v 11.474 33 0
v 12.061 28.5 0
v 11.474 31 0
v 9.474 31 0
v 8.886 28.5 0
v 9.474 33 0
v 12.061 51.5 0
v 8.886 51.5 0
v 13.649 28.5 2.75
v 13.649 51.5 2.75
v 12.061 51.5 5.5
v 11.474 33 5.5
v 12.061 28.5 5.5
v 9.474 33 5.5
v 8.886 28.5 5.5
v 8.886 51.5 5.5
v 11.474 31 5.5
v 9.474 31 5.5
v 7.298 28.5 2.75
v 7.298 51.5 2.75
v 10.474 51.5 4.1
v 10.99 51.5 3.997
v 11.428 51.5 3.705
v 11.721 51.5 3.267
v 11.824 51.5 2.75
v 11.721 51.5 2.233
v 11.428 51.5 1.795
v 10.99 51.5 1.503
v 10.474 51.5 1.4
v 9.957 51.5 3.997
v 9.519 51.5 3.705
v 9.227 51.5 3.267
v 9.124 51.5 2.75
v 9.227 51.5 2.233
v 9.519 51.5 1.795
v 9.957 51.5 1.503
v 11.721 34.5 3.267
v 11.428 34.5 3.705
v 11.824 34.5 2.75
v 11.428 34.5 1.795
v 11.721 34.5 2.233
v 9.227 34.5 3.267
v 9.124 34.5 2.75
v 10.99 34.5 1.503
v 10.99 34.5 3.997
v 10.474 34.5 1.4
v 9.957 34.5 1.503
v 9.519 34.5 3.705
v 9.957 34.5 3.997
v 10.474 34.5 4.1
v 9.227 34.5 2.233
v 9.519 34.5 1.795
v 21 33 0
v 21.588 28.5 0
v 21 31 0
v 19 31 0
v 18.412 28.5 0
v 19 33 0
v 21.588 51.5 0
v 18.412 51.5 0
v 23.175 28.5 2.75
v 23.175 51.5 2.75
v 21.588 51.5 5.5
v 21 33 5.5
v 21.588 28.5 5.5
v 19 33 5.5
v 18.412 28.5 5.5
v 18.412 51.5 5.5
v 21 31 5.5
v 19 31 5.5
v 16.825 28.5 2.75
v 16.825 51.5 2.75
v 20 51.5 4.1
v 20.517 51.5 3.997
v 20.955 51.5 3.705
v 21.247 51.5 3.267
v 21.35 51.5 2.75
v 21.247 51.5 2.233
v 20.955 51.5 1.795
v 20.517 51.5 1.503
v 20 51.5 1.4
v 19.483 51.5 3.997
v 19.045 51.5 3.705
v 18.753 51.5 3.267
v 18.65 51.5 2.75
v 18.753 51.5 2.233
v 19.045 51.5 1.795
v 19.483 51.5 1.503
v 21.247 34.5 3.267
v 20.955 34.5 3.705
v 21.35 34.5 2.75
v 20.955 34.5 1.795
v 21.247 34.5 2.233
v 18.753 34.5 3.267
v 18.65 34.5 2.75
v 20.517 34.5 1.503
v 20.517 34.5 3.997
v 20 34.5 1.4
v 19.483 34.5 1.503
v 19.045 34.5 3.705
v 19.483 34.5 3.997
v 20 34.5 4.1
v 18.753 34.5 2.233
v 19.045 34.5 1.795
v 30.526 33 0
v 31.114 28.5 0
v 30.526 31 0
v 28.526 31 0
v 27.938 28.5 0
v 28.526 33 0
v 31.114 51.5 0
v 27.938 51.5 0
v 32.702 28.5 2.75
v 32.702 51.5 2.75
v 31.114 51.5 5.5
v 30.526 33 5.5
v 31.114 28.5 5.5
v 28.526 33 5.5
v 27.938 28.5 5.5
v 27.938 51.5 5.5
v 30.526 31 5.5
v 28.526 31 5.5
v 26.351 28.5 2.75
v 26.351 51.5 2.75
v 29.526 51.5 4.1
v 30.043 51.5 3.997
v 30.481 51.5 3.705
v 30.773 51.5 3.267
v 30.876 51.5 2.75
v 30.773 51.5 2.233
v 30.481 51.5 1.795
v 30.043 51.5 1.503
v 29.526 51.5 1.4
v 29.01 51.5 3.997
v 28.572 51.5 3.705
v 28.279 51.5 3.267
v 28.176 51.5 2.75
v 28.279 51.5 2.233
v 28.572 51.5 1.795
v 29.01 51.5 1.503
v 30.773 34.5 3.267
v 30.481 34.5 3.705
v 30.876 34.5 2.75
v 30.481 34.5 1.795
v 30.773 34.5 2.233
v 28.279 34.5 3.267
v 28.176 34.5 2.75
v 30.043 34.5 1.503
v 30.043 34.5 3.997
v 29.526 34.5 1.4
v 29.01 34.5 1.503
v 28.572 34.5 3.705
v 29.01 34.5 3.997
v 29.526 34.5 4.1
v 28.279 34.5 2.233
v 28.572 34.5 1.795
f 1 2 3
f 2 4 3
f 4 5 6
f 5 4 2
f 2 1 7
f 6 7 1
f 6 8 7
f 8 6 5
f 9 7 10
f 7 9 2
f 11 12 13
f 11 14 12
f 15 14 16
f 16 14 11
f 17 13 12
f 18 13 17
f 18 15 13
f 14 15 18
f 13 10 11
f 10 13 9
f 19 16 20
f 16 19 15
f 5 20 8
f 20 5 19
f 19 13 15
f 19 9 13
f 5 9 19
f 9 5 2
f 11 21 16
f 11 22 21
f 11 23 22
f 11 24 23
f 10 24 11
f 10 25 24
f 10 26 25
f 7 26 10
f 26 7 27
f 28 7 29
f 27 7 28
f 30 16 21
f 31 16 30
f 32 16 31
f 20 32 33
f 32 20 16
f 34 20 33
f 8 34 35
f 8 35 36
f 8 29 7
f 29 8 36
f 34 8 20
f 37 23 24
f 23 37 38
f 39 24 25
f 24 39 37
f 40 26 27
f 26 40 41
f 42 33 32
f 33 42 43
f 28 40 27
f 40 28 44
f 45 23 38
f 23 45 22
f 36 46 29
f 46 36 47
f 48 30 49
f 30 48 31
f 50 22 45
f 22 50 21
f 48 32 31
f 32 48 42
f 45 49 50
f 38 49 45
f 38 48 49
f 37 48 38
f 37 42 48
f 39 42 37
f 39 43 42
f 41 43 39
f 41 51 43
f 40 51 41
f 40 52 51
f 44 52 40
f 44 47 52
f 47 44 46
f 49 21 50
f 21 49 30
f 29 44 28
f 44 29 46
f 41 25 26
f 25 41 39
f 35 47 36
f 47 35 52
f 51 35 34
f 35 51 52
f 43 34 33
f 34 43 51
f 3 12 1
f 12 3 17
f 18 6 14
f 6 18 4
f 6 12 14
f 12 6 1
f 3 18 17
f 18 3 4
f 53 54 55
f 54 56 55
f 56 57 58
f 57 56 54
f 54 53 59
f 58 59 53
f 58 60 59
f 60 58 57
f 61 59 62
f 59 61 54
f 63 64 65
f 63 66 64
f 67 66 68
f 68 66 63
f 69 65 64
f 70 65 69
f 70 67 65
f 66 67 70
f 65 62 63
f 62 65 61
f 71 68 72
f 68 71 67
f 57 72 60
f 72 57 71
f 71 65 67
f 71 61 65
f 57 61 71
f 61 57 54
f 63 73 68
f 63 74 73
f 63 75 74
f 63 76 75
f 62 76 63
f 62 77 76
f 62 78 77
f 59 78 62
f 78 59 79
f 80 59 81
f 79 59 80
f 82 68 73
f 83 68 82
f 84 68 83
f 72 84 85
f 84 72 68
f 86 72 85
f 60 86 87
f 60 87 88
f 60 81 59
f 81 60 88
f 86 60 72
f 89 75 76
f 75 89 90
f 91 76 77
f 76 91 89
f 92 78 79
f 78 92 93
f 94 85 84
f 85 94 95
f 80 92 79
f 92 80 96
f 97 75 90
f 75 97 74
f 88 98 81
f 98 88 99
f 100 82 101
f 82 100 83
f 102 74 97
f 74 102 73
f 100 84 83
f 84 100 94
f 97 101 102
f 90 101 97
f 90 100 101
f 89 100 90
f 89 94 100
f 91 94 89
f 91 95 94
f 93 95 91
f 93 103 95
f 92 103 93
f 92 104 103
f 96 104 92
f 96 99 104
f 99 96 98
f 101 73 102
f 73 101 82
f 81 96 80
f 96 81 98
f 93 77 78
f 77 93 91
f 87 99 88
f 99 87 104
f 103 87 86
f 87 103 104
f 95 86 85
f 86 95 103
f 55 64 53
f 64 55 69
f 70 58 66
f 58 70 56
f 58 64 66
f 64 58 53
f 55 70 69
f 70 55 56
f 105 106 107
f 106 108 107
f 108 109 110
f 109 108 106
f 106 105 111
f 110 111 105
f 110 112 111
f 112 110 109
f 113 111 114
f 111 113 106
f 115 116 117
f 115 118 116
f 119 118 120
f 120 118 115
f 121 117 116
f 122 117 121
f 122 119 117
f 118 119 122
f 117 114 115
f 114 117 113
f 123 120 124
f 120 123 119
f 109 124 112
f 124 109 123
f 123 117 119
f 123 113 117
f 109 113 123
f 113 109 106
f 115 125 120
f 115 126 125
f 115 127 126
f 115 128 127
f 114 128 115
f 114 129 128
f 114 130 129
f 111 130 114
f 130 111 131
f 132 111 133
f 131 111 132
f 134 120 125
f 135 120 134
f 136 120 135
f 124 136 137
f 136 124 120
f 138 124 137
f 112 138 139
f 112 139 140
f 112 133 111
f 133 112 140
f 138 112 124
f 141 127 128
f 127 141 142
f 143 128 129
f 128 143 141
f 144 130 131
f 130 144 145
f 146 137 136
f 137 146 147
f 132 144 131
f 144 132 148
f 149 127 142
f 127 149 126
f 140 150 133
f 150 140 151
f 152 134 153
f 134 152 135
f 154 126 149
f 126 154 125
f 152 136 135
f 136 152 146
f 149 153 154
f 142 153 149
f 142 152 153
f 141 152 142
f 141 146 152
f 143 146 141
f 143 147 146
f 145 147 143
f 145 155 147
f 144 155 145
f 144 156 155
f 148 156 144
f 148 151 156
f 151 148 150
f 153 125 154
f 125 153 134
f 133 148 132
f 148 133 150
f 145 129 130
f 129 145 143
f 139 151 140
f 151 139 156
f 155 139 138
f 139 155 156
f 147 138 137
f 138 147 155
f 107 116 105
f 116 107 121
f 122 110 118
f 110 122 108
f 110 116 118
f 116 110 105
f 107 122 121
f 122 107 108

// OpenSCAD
/*

Parametric Prosthetic Hand String Tensioner
Based on a part designed by Ivan Owen
Put into parametric format by David Orgeman

Released under the terms of the GNU GPL v3.0 

This program is free software: you can redistribute it and/or modify
it under the terms of the GNU General Public License as published by
the Free Software Foundation, either version 3 of the License, or
(at your option) any later version.

This program is distributed in the hope that it will be useful,
but WITHOUT ANY WARRANTY; without even the implied warranty of
MERCHANTABILITY or FITNESS FOR A PARTICULAR PURPOSE. See the
GNU General Public License for more details.

You should have received a copy of the GNU General Public License
along with this program. If not, see <http://www.gnu.org/licenses/>.

*/


Metric_Table=[ 	["M2", 0.8000, 1.1000, 2.3094], 
				["M25", 1.0250, 1.3750, 2.8868], 
				["M3", 1.2500, 1.6500, 3.1754], 
                ["M35", 1.3500, 1.6500, 3.1754],
				["M4", 1.6500, 2.2000, 4.0415], 
				["M5", 2.1000, 2.7500, 4.6188]  ];


//Standard hole sizes for tapping into plastic
//M2T=1.60;
//M25T=2.05;
//M3T=2.5;
//M4T=3.3;
//M5T=4.2;

//Standard hole sizes for metric screws
//M2=2.2;
//M25=2.75;
//M3=3.3;
//M4=4.4;
//M5=5.5;

//Standard nut sizes - flat-to-flat and then as radius
//M2NutW=4.0;
//M25NutW=5.0;
//M3NutW=5.5;
//M4NutW=7.0;
//M5NutW=8.0;
//M2NutR=(M2NutW/cos(30))/2;
//M25NutR=(M25NutW/cos(30))/2;
//M3NutR=(M3NutW/cos(30))/2;
//M4NutR=(M4NutW/cos(30))/2;
//M5NutR=(M5NutW/cos(30))/2;


//PARAMETERS

//size of the tuner drive screws
Tuner_Size="M35";//[ M2, M25, M3, M4, M5 ]

Metric_Index=search([Tuner_Size], Metric_Table)[0];
Tuner_Screw_Radius=Metric_Table[Metric_Index][1];
Block_Screw_Radius=Metric_Table[Metric_Index][2];
Rod_Radius=Metric_Table[Metric_Index][3];

//extra elevation of the tuners and strings above the gauntlet
Extra_Tuner_Height=-2.0;

//slightly increase the length of rods and tuner block for springs
Spring_Length_Adjustment=0;

//length of the spring covering shell on the back of the tuner
Spring_Shield_Adjustment=0;

//functional length of the tuner rods
Rod_Length=18.0;

//extra tuner rod length to tie the strings to.
Extra_Tuner_Length=5.0;

//size of the hole through the tuners for the drive strings
String_Radius=1.0;

//number of tuners - most will want 5, some might want 4
Tuner_Count=3;//[1, 2, 3, 4, 5]

//extra gap in the tuner slots to allow them to slide more readily
Tuner_Fit=0.15;


//0 to print tuners, 1 to omit them
Print_Tuners=0;//[0, 1]

//0 to print the block, 1 to omit it
Print_Block=1;//[0, 1]

b1 = 2.1;
b2 = b1 *2;
b3 = 3.8;
b4 = 2.6;
r1 = 2.2;


//RENDER
if (Print_Block == 0)
	{
	translate([0, 0, 3])
		block();
	}
	

if (Print_Tuners == 0)
	{
	if (Tuner_Count>0)
		{
		for(i=[1:Tuner_Count])
			{
			translate([20-3*Rod_Radius*(Tuner_Count+1)/2 + 3*Rod_Radius*i, 40, 0])
				tuner();
			}
		}
	}


module block()
	{
        
	rotate(a=[0, 0, -90])
	difference()
		{
		translate([-b1*Rod_Radius*(Tuner_Count+1)/2, 0, -3])
			cube([b2*Rod_Radius*(Tuner_Count+1)/2, Rod_Length+3+Spring_Length_Adjustment+Spring_Shield_Adjustment, b3*Rod_Radius+Extra_Tuner_Height+3]);
									
		for(i=[1:Tuner_Count])
			{
			translate([-b4*Rod_Radius*(Tuner_Count+1)/2 + b4*Rod_Radius*i, Rod_Length+0.5+Spring_Length_Adjustment, 1.9*Rod_Radius+Extra_Tuner_Height])
				rotate(a=[0, 30, 0])
				rotate(a=[90, 0, 0])
					cylinder(h=Rod_Length+2+Spring_Length_Adjustment, r=Rod_Radius+Tuner_Fit, $fn=6);
			}

		for(i=[1:Tuner_Count])
			{
			translate([-b4*Rod_Radius*(Tuner_Count+1)/2 + b4*Rod_Radius*i, 50, 1.9*Rod_Radius+Extra_Tuner_Height])
				rotate(a=[0, 30, 0])
				rotate(a=[90, 0, 0])
					cylinder(h=100, r=Block_Screw_Radius/cos(30), $fn=6);
			}
		
		translate([-b1*Rod_Radius*(Tuner_Count+1)/2-0.01, 0, b3*Rod_Radius+Extra_Tuner_Height+0.01])
			rotate(a=[-90, 0, 0])
				fillet(r=r1*Rod_Radius, h=200);
		translate([b1*Rod_Radius*(Tuner_Count+1)/2+0.01, 0, b3*Rod_Radius+Extra_Tuner_Height+0.01])
			rotate(a=[0, 90, 0])
			rotate(a=[-90, 0, 0])
				fillet(r=r1*Rod_Radius, h=200);

		difference()
			{
			translate([-b1*Rod_Radius*(Tuner_Count+1)/2+2, Rod_Length+3+Spring_Length_Adjustment, -6])
				cube([b2*Rod_Radius*(Tuner_Count+1)/2-4, Spring_Shield_Adjustment+2, b3*Rod_Radius+Extra_Tuner_Height+6-2]);
			translate([-b1*Rod_Radius*(Tuner_Count+1)/2+2-0.01, 0, b3*Rod_Radius+Extra_Tuner_Height-2+0.01])
				rotate(a=[-90, 0, 0])
					fillet(r=1.6*Rod_Radius, h=200);
			translate([b1*Rod_Radius*(Tuner_Count+1)/2-2+0.01, 0, b3*Rod_Radius+Extra_Tuner_Height-2+0.01])
				rotate(a=[0, 90, 0])
				rotate(a=[-90, 0, 0])
					fillet(r=1.6*Rod_Radius, h=200);
			}

		}	
	}	
	
	
module tuner()
	{
	translate([0, (Rod_Length+Extra_Tuner_Length+Spring_Length_Adjustment)/2, Rod_Radius*cos(30)])
	difference()
		{
		rotate(a=[90, 0, 0])
			cylinder(h=Rod_Length+Extra_Tuner_Length+Spring_Length_Adjustment, r=Rod_Radius, $fn=6);
		translate([0, 1, 0])
			rotate(a=[90, 0, 0])
				cylinder(h=Rod_Length+Spring_Length_Adjustment, r=Tuner_Screw_Radius, $fn=16);
		translate([-String_Radius, -Rod_Length-Spring_Length_Adjustment-Extra_Tuner_Length/2, -10])
//			polyhole(h=20, d=String_Radius*2);
//			cylinder(h=20, r=String_Radius, center=true);
			cube([2*String_Radius, 2*String_Radius, 20]);
		}
	}


	
module fillet(r, h) 
	{
	translate([r/2, r/2, 0])
		difference() 
			{
			cube([r, r, h], center=true);
			translate([r/2, r/2, 0])
				cylinder(h=h+1, r=r, center=true, $fn=40);
			}
	}

	
	
// By nophead
module polyhole(d, h) 
	{
	n=max(round(2*d), 3);
	rotate(v=[0, 0, 180])
		cylinder(h=h, r=(d/2)/cos(180/n), center=true, $fn=n);
	}
